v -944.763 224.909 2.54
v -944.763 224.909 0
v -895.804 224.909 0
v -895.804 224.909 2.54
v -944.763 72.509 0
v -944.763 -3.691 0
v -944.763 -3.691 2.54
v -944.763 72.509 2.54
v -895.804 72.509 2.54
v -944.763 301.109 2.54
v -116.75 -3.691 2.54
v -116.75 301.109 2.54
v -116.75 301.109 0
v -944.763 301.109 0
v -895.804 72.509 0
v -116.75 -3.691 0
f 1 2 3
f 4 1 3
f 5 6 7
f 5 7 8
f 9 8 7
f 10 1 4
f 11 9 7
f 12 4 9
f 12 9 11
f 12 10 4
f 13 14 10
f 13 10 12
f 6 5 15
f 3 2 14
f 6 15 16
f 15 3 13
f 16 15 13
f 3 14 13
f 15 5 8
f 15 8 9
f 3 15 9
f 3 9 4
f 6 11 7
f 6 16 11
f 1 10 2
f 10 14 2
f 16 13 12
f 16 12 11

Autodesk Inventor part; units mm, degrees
ref_plane "YZ Plane" through (0, 0, 0) normal (1, 0, 0) x (0, 1, 0)
ref_plane "XZ Plane" through (0, 0, 0) normal (0, 1, 0) x (-1, 0, 0)
ref_plane "XY Plane" through (0, 0, 0) normal (0, 0, 1) x (1, 0, 0)
sketch "Sketch1" plane through (0, 0, 0) normal (0, 0, 1) x (1, 0, 0)
  line L0 (-116.7504, -3.6908) -> (-895.8037, -3.6908)
  line L1 (-895.8037, -3.6908) -> (-895.8037, 301.1092)
  line L2 (-895.8037, 301.1092) -> (-116.7504, 301.1092)
  line L3 (-116.7504, 301.1092) -> (-116.7504, -3.6908)
  line L4 (-895.8037, -3.6908) -> (-944.7633, -3.6908)
  line L5 (-944.7633, -3.6908) -> (-944.7633, 72.5092)
  line L6 (-944.7633, 72.5092) -> (-895.8037, 72.5092)
  line L7 (-895.8037, 72.5092) -> (-895.8037, -3.6908)
  line L8 (-895.8037, 301.1092) -> (-944.7633, 301.1092)
  line L9 (-944.7633, 301.1092) -> (-944.7633, 224.9092)
  line L10 (-944.7633, 224.9092) -> (-895.8037, 224.9092)
  line L11 (-895.8037, 224.9092) -> (-895.8037, 301.1092)
  line L12 (-116.5344, 301.1092) -> (-116.5344, -3.6908) projected
  point P0 (0, 0)
  dimension "d1" = 304.8
  dimension "d4" = 76.2
  dimension "d5" = 76.2
extrude "Extrusion1" add sketch "Sketch1" along normal blind 2.54
properties part number "plexiglass2" material "Glass"
